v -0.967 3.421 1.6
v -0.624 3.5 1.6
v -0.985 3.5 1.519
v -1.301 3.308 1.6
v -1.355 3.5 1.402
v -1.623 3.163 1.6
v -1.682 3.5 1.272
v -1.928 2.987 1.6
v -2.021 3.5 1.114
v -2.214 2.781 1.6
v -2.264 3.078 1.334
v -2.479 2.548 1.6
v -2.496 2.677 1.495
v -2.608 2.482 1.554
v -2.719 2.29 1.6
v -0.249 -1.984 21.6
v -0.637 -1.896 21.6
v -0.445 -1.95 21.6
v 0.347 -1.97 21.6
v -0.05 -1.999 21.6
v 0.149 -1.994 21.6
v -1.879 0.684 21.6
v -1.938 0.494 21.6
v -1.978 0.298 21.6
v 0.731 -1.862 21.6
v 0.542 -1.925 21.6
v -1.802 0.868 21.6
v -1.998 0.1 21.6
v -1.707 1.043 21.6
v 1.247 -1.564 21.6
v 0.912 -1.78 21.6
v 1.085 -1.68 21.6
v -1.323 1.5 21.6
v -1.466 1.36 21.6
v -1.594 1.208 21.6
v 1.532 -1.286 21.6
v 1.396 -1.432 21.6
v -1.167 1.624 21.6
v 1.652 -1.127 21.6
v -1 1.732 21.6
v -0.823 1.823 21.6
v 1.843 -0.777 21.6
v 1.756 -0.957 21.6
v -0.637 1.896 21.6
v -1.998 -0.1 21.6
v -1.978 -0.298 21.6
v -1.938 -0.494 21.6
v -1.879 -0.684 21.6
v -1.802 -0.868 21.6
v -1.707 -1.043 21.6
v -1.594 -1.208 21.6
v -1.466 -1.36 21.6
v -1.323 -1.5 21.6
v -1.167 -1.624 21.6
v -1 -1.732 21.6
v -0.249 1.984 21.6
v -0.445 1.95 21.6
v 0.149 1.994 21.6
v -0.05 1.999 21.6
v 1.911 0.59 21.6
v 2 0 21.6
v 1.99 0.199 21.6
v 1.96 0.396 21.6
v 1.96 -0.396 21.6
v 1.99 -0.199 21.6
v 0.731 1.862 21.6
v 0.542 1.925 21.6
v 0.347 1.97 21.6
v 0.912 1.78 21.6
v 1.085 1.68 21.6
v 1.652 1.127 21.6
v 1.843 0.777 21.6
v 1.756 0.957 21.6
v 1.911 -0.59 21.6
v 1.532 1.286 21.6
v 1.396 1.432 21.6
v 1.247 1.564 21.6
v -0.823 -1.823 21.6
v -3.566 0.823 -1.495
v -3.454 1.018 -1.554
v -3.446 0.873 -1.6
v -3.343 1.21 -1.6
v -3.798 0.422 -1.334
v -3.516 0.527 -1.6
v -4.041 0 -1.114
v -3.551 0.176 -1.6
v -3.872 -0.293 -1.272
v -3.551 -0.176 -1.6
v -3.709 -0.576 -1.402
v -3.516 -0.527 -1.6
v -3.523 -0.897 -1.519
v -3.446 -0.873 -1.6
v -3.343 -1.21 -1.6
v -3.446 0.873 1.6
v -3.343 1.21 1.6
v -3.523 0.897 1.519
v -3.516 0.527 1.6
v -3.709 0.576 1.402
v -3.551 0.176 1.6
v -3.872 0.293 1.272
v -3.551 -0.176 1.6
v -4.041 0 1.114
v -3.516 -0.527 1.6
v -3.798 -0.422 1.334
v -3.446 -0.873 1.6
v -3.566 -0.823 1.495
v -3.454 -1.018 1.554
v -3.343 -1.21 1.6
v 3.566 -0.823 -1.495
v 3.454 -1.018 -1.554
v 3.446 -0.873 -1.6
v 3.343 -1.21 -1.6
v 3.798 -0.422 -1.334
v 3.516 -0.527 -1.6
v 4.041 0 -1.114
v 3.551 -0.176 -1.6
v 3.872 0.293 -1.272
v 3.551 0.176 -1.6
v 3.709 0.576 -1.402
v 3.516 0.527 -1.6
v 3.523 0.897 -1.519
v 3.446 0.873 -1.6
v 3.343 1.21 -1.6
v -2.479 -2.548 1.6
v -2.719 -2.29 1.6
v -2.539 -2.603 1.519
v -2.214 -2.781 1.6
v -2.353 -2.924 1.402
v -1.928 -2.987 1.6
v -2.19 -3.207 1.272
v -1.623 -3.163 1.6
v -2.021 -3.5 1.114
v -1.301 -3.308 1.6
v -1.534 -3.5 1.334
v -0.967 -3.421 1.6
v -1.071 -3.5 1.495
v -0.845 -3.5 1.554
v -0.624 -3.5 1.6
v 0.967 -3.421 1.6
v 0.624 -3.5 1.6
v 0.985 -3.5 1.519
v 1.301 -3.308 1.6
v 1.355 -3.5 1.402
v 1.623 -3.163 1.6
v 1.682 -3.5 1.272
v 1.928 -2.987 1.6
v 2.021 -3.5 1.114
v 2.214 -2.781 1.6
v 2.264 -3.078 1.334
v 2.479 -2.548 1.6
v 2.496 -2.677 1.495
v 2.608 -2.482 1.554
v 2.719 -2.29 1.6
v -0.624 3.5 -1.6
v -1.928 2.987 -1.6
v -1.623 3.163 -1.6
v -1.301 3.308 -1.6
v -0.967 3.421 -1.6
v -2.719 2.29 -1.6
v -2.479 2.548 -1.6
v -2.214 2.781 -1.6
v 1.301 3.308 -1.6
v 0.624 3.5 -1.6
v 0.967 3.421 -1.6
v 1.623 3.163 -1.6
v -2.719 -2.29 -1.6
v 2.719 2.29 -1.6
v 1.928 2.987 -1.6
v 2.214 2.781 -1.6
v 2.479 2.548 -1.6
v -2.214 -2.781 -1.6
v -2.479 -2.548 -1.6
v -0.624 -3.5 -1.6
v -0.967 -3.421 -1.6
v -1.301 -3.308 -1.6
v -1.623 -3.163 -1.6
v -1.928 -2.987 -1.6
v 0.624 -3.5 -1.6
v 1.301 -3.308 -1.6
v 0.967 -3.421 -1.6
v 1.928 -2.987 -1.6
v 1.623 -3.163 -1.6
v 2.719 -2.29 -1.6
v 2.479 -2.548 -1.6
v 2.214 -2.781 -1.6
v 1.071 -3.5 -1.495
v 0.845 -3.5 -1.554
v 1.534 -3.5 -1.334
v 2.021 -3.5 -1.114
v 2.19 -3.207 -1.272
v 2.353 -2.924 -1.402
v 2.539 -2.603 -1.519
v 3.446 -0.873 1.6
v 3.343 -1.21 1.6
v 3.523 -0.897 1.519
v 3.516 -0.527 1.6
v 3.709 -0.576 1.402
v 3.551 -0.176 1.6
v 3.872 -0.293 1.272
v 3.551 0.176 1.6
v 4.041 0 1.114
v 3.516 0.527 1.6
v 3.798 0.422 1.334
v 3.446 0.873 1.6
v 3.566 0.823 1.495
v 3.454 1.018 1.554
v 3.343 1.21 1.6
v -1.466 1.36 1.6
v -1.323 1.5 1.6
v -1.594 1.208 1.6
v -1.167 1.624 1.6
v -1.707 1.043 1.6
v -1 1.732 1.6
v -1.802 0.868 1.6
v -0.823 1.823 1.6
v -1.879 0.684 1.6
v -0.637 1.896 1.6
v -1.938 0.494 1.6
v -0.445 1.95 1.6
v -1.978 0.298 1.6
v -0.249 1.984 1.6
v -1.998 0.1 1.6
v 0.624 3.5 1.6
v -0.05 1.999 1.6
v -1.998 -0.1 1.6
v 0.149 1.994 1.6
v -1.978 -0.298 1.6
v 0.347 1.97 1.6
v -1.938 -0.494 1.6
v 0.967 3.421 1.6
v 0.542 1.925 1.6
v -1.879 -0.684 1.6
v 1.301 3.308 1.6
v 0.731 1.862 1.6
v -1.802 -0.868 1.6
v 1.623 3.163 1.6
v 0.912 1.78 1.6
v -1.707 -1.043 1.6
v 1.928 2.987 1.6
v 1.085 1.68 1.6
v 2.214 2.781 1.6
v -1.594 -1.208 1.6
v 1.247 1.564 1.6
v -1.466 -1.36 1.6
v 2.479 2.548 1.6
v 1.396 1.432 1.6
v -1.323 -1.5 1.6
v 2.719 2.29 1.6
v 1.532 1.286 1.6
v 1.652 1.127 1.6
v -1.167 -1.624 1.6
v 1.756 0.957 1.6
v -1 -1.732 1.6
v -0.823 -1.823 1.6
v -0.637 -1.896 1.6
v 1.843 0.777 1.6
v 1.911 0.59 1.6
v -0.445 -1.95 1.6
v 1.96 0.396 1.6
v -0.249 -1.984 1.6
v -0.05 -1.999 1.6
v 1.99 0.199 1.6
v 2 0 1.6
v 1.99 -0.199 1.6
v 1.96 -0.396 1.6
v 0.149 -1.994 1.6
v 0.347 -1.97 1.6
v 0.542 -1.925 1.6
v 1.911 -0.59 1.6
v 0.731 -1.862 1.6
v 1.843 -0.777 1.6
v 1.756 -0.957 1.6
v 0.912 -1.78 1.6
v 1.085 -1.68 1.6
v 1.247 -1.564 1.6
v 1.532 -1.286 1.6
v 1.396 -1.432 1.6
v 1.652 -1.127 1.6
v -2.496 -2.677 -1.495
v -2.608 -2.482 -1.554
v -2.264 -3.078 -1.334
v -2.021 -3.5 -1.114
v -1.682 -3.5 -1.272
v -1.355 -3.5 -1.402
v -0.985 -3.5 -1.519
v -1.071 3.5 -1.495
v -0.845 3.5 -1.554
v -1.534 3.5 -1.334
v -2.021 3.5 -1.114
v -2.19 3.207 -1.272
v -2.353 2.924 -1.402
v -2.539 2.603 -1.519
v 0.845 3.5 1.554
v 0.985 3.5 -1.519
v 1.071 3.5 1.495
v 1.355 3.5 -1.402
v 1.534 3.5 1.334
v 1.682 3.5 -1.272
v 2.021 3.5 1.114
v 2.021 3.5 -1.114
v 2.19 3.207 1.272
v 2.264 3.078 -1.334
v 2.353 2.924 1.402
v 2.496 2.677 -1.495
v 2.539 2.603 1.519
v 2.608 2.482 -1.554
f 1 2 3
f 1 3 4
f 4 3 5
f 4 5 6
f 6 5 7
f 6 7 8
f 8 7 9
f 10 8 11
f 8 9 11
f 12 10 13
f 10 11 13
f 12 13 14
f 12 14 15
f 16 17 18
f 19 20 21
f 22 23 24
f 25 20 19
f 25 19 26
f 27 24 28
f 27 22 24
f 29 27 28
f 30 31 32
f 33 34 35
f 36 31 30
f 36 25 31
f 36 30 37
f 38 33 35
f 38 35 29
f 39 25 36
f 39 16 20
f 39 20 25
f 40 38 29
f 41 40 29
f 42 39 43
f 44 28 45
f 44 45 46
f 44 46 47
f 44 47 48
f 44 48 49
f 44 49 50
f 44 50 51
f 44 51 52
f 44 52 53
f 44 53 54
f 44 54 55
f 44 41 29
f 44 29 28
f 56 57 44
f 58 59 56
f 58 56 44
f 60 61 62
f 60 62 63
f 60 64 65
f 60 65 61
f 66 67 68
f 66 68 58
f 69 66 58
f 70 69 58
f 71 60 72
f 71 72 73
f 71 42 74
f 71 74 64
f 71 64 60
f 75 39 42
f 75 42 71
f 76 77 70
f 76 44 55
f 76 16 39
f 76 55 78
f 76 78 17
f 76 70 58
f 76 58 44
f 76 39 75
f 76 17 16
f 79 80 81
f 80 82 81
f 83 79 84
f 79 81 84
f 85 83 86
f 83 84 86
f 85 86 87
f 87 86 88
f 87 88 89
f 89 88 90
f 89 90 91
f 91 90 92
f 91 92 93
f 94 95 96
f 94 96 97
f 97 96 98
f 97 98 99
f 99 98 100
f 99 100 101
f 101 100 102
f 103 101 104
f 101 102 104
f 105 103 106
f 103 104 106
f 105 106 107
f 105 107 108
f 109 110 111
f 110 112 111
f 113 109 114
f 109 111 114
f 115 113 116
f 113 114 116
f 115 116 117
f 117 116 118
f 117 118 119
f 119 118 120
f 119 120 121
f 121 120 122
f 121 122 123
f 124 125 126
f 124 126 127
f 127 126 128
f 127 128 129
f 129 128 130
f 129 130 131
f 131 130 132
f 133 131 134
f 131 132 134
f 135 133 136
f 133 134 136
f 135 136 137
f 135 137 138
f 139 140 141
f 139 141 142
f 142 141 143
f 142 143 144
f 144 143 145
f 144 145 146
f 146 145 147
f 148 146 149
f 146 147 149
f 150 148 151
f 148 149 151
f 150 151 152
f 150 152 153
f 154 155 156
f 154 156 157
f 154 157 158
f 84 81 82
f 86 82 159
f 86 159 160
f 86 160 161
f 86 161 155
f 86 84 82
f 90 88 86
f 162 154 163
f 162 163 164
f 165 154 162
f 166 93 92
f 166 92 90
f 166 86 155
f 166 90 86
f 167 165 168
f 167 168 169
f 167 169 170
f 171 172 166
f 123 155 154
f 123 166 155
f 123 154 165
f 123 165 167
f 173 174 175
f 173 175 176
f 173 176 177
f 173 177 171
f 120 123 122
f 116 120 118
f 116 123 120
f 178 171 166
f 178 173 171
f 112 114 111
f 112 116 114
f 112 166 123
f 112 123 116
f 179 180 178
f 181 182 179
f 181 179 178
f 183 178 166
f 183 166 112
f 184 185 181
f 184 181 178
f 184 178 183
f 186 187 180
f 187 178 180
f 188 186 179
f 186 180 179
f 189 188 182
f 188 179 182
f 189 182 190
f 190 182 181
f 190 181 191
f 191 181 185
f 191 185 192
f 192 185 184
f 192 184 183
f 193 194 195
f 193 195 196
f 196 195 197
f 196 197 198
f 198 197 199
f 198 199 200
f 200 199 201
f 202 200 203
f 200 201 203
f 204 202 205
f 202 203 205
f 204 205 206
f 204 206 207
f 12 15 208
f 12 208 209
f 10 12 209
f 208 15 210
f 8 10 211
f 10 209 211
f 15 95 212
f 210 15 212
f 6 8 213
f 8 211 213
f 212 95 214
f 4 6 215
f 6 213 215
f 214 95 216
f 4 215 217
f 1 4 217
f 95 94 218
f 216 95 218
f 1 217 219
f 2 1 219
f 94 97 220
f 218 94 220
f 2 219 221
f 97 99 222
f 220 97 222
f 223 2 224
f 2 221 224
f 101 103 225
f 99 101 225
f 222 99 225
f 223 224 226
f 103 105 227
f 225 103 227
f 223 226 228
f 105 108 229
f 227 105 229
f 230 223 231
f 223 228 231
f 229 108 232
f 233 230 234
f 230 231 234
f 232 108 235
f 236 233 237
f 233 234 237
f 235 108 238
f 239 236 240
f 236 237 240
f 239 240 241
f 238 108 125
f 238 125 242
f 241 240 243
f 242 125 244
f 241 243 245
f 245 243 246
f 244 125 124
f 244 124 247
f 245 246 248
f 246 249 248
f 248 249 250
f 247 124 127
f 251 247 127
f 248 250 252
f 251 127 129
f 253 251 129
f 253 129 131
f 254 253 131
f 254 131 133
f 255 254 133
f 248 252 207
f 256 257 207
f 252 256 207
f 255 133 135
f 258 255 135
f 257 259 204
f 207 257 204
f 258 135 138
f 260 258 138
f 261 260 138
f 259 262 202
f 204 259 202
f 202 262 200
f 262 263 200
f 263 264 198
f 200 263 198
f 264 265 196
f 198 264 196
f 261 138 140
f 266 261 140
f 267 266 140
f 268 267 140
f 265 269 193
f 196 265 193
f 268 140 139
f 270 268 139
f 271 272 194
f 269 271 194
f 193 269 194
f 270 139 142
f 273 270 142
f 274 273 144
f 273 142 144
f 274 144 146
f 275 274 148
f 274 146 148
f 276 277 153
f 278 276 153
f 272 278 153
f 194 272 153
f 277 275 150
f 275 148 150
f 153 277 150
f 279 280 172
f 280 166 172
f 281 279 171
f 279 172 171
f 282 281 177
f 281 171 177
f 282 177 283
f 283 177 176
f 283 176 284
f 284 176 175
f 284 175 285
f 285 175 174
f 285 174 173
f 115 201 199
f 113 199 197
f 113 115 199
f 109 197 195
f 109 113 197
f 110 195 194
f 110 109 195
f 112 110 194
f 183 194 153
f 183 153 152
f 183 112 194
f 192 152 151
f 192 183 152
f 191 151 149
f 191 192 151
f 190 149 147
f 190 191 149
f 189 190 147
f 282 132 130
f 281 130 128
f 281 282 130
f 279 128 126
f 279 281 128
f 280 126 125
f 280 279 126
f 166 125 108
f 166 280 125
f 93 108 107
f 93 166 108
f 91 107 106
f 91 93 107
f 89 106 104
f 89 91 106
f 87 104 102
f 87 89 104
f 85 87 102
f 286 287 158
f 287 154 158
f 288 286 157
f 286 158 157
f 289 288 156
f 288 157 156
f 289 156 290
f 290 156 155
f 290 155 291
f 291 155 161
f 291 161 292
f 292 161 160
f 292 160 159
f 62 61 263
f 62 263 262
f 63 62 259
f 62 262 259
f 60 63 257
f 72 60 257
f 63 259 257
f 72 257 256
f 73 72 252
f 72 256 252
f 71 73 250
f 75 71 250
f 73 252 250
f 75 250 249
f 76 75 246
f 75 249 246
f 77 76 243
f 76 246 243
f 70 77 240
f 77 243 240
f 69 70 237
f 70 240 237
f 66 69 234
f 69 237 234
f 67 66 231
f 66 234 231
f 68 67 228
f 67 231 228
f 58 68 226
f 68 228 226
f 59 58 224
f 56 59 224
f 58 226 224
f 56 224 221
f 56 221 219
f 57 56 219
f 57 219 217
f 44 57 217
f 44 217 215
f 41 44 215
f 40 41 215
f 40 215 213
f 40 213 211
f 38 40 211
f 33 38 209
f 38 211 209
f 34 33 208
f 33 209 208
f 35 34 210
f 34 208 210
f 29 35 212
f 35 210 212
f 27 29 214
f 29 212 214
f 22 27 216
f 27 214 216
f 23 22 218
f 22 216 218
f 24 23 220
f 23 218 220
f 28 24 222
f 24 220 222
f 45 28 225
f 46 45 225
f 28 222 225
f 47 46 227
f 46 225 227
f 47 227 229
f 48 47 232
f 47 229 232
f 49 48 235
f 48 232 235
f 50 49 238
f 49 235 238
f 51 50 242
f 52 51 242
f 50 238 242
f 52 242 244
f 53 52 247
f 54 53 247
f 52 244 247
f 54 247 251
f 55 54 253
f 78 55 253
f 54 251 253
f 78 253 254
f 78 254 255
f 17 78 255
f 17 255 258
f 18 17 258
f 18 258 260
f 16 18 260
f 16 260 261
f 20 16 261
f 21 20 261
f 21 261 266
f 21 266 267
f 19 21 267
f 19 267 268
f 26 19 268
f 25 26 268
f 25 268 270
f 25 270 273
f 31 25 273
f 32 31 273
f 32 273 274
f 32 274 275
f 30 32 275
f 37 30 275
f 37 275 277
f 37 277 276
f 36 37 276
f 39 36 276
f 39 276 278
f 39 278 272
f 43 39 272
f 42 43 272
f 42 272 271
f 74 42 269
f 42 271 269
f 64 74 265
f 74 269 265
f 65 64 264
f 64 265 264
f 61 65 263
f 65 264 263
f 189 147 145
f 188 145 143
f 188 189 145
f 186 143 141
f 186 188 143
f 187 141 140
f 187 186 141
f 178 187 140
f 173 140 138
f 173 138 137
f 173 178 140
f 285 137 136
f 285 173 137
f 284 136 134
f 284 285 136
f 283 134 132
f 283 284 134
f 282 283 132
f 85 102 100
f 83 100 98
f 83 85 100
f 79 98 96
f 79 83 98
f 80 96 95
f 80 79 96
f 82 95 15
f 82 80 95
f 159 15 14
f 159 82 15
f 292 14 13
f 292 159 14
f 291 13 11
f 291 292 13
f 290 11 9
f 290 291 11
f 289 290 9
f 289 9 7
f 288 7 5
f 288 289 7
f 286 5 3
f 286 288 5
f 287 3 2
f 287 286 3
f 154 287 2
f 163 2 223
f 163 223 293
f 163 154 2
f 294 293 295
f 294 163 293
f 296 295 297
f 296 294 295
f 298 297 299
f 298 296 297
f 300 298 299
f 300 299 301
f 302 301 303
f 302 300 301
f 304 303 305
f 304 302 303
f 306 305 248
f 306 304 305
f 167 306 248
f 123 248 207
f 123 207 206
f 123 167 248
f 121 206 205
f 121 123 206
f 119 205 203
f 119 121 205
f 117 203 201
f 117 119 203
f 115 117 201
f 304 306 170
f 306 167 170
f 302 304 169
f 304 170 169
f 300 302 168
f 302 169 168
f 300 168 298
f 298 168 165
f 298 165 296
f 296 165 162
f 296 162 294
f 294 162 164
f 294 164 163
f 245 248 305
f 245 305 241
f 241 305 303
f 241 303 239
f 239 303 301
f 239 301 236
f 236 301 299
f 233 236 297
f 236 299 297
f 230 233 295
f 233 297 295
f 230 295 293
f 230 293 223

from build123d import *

# Parameters (mm, degrees)
PAD_DEPTH    = 1.6
SKETCH_R     = 2
PAD001_DEPTH = 20


with BuildPart() as part:
    # Sketch001 → Pad (new body, symmetric)
    with BuildSketch(Plane(origin=(0, 0, 0), x_dir=(1, 0, 0), z_dir=(0, 0, -1))):
        Polygon((4.041452, 0), (2.020726, 3.5), (-2.020726, 3.5), (-4.041452, 0), (-2.020726, -3.5), (2.020726, -3.5), align=None)
    extrude(amount=PAD_DEPTH, both=True)

    # Sketch (on Face7 of Pad) → Pad001 (join)
    with BuildSketch(Plane.XY.offset(1.6)):
        Circle(SKETCH_R)
    extrude(amount=PAD001_DEPTH)

    # Sketch002 → Groove (revolve, cut)
    with BuildSketch(Plane.XZ):
        Polygon((3.100253, 2.054888), (4.213852, 0.941288), (4.213852, -0.941288), (3.100253, -2.054888), (5.186611, -2.054888), (5.186611, 2.054888), align=None)
    revolve(axis=Axis((0, 0, 0), (0, 0, 1)), mode=Mode.SUBTRACT)


solid = part.part
